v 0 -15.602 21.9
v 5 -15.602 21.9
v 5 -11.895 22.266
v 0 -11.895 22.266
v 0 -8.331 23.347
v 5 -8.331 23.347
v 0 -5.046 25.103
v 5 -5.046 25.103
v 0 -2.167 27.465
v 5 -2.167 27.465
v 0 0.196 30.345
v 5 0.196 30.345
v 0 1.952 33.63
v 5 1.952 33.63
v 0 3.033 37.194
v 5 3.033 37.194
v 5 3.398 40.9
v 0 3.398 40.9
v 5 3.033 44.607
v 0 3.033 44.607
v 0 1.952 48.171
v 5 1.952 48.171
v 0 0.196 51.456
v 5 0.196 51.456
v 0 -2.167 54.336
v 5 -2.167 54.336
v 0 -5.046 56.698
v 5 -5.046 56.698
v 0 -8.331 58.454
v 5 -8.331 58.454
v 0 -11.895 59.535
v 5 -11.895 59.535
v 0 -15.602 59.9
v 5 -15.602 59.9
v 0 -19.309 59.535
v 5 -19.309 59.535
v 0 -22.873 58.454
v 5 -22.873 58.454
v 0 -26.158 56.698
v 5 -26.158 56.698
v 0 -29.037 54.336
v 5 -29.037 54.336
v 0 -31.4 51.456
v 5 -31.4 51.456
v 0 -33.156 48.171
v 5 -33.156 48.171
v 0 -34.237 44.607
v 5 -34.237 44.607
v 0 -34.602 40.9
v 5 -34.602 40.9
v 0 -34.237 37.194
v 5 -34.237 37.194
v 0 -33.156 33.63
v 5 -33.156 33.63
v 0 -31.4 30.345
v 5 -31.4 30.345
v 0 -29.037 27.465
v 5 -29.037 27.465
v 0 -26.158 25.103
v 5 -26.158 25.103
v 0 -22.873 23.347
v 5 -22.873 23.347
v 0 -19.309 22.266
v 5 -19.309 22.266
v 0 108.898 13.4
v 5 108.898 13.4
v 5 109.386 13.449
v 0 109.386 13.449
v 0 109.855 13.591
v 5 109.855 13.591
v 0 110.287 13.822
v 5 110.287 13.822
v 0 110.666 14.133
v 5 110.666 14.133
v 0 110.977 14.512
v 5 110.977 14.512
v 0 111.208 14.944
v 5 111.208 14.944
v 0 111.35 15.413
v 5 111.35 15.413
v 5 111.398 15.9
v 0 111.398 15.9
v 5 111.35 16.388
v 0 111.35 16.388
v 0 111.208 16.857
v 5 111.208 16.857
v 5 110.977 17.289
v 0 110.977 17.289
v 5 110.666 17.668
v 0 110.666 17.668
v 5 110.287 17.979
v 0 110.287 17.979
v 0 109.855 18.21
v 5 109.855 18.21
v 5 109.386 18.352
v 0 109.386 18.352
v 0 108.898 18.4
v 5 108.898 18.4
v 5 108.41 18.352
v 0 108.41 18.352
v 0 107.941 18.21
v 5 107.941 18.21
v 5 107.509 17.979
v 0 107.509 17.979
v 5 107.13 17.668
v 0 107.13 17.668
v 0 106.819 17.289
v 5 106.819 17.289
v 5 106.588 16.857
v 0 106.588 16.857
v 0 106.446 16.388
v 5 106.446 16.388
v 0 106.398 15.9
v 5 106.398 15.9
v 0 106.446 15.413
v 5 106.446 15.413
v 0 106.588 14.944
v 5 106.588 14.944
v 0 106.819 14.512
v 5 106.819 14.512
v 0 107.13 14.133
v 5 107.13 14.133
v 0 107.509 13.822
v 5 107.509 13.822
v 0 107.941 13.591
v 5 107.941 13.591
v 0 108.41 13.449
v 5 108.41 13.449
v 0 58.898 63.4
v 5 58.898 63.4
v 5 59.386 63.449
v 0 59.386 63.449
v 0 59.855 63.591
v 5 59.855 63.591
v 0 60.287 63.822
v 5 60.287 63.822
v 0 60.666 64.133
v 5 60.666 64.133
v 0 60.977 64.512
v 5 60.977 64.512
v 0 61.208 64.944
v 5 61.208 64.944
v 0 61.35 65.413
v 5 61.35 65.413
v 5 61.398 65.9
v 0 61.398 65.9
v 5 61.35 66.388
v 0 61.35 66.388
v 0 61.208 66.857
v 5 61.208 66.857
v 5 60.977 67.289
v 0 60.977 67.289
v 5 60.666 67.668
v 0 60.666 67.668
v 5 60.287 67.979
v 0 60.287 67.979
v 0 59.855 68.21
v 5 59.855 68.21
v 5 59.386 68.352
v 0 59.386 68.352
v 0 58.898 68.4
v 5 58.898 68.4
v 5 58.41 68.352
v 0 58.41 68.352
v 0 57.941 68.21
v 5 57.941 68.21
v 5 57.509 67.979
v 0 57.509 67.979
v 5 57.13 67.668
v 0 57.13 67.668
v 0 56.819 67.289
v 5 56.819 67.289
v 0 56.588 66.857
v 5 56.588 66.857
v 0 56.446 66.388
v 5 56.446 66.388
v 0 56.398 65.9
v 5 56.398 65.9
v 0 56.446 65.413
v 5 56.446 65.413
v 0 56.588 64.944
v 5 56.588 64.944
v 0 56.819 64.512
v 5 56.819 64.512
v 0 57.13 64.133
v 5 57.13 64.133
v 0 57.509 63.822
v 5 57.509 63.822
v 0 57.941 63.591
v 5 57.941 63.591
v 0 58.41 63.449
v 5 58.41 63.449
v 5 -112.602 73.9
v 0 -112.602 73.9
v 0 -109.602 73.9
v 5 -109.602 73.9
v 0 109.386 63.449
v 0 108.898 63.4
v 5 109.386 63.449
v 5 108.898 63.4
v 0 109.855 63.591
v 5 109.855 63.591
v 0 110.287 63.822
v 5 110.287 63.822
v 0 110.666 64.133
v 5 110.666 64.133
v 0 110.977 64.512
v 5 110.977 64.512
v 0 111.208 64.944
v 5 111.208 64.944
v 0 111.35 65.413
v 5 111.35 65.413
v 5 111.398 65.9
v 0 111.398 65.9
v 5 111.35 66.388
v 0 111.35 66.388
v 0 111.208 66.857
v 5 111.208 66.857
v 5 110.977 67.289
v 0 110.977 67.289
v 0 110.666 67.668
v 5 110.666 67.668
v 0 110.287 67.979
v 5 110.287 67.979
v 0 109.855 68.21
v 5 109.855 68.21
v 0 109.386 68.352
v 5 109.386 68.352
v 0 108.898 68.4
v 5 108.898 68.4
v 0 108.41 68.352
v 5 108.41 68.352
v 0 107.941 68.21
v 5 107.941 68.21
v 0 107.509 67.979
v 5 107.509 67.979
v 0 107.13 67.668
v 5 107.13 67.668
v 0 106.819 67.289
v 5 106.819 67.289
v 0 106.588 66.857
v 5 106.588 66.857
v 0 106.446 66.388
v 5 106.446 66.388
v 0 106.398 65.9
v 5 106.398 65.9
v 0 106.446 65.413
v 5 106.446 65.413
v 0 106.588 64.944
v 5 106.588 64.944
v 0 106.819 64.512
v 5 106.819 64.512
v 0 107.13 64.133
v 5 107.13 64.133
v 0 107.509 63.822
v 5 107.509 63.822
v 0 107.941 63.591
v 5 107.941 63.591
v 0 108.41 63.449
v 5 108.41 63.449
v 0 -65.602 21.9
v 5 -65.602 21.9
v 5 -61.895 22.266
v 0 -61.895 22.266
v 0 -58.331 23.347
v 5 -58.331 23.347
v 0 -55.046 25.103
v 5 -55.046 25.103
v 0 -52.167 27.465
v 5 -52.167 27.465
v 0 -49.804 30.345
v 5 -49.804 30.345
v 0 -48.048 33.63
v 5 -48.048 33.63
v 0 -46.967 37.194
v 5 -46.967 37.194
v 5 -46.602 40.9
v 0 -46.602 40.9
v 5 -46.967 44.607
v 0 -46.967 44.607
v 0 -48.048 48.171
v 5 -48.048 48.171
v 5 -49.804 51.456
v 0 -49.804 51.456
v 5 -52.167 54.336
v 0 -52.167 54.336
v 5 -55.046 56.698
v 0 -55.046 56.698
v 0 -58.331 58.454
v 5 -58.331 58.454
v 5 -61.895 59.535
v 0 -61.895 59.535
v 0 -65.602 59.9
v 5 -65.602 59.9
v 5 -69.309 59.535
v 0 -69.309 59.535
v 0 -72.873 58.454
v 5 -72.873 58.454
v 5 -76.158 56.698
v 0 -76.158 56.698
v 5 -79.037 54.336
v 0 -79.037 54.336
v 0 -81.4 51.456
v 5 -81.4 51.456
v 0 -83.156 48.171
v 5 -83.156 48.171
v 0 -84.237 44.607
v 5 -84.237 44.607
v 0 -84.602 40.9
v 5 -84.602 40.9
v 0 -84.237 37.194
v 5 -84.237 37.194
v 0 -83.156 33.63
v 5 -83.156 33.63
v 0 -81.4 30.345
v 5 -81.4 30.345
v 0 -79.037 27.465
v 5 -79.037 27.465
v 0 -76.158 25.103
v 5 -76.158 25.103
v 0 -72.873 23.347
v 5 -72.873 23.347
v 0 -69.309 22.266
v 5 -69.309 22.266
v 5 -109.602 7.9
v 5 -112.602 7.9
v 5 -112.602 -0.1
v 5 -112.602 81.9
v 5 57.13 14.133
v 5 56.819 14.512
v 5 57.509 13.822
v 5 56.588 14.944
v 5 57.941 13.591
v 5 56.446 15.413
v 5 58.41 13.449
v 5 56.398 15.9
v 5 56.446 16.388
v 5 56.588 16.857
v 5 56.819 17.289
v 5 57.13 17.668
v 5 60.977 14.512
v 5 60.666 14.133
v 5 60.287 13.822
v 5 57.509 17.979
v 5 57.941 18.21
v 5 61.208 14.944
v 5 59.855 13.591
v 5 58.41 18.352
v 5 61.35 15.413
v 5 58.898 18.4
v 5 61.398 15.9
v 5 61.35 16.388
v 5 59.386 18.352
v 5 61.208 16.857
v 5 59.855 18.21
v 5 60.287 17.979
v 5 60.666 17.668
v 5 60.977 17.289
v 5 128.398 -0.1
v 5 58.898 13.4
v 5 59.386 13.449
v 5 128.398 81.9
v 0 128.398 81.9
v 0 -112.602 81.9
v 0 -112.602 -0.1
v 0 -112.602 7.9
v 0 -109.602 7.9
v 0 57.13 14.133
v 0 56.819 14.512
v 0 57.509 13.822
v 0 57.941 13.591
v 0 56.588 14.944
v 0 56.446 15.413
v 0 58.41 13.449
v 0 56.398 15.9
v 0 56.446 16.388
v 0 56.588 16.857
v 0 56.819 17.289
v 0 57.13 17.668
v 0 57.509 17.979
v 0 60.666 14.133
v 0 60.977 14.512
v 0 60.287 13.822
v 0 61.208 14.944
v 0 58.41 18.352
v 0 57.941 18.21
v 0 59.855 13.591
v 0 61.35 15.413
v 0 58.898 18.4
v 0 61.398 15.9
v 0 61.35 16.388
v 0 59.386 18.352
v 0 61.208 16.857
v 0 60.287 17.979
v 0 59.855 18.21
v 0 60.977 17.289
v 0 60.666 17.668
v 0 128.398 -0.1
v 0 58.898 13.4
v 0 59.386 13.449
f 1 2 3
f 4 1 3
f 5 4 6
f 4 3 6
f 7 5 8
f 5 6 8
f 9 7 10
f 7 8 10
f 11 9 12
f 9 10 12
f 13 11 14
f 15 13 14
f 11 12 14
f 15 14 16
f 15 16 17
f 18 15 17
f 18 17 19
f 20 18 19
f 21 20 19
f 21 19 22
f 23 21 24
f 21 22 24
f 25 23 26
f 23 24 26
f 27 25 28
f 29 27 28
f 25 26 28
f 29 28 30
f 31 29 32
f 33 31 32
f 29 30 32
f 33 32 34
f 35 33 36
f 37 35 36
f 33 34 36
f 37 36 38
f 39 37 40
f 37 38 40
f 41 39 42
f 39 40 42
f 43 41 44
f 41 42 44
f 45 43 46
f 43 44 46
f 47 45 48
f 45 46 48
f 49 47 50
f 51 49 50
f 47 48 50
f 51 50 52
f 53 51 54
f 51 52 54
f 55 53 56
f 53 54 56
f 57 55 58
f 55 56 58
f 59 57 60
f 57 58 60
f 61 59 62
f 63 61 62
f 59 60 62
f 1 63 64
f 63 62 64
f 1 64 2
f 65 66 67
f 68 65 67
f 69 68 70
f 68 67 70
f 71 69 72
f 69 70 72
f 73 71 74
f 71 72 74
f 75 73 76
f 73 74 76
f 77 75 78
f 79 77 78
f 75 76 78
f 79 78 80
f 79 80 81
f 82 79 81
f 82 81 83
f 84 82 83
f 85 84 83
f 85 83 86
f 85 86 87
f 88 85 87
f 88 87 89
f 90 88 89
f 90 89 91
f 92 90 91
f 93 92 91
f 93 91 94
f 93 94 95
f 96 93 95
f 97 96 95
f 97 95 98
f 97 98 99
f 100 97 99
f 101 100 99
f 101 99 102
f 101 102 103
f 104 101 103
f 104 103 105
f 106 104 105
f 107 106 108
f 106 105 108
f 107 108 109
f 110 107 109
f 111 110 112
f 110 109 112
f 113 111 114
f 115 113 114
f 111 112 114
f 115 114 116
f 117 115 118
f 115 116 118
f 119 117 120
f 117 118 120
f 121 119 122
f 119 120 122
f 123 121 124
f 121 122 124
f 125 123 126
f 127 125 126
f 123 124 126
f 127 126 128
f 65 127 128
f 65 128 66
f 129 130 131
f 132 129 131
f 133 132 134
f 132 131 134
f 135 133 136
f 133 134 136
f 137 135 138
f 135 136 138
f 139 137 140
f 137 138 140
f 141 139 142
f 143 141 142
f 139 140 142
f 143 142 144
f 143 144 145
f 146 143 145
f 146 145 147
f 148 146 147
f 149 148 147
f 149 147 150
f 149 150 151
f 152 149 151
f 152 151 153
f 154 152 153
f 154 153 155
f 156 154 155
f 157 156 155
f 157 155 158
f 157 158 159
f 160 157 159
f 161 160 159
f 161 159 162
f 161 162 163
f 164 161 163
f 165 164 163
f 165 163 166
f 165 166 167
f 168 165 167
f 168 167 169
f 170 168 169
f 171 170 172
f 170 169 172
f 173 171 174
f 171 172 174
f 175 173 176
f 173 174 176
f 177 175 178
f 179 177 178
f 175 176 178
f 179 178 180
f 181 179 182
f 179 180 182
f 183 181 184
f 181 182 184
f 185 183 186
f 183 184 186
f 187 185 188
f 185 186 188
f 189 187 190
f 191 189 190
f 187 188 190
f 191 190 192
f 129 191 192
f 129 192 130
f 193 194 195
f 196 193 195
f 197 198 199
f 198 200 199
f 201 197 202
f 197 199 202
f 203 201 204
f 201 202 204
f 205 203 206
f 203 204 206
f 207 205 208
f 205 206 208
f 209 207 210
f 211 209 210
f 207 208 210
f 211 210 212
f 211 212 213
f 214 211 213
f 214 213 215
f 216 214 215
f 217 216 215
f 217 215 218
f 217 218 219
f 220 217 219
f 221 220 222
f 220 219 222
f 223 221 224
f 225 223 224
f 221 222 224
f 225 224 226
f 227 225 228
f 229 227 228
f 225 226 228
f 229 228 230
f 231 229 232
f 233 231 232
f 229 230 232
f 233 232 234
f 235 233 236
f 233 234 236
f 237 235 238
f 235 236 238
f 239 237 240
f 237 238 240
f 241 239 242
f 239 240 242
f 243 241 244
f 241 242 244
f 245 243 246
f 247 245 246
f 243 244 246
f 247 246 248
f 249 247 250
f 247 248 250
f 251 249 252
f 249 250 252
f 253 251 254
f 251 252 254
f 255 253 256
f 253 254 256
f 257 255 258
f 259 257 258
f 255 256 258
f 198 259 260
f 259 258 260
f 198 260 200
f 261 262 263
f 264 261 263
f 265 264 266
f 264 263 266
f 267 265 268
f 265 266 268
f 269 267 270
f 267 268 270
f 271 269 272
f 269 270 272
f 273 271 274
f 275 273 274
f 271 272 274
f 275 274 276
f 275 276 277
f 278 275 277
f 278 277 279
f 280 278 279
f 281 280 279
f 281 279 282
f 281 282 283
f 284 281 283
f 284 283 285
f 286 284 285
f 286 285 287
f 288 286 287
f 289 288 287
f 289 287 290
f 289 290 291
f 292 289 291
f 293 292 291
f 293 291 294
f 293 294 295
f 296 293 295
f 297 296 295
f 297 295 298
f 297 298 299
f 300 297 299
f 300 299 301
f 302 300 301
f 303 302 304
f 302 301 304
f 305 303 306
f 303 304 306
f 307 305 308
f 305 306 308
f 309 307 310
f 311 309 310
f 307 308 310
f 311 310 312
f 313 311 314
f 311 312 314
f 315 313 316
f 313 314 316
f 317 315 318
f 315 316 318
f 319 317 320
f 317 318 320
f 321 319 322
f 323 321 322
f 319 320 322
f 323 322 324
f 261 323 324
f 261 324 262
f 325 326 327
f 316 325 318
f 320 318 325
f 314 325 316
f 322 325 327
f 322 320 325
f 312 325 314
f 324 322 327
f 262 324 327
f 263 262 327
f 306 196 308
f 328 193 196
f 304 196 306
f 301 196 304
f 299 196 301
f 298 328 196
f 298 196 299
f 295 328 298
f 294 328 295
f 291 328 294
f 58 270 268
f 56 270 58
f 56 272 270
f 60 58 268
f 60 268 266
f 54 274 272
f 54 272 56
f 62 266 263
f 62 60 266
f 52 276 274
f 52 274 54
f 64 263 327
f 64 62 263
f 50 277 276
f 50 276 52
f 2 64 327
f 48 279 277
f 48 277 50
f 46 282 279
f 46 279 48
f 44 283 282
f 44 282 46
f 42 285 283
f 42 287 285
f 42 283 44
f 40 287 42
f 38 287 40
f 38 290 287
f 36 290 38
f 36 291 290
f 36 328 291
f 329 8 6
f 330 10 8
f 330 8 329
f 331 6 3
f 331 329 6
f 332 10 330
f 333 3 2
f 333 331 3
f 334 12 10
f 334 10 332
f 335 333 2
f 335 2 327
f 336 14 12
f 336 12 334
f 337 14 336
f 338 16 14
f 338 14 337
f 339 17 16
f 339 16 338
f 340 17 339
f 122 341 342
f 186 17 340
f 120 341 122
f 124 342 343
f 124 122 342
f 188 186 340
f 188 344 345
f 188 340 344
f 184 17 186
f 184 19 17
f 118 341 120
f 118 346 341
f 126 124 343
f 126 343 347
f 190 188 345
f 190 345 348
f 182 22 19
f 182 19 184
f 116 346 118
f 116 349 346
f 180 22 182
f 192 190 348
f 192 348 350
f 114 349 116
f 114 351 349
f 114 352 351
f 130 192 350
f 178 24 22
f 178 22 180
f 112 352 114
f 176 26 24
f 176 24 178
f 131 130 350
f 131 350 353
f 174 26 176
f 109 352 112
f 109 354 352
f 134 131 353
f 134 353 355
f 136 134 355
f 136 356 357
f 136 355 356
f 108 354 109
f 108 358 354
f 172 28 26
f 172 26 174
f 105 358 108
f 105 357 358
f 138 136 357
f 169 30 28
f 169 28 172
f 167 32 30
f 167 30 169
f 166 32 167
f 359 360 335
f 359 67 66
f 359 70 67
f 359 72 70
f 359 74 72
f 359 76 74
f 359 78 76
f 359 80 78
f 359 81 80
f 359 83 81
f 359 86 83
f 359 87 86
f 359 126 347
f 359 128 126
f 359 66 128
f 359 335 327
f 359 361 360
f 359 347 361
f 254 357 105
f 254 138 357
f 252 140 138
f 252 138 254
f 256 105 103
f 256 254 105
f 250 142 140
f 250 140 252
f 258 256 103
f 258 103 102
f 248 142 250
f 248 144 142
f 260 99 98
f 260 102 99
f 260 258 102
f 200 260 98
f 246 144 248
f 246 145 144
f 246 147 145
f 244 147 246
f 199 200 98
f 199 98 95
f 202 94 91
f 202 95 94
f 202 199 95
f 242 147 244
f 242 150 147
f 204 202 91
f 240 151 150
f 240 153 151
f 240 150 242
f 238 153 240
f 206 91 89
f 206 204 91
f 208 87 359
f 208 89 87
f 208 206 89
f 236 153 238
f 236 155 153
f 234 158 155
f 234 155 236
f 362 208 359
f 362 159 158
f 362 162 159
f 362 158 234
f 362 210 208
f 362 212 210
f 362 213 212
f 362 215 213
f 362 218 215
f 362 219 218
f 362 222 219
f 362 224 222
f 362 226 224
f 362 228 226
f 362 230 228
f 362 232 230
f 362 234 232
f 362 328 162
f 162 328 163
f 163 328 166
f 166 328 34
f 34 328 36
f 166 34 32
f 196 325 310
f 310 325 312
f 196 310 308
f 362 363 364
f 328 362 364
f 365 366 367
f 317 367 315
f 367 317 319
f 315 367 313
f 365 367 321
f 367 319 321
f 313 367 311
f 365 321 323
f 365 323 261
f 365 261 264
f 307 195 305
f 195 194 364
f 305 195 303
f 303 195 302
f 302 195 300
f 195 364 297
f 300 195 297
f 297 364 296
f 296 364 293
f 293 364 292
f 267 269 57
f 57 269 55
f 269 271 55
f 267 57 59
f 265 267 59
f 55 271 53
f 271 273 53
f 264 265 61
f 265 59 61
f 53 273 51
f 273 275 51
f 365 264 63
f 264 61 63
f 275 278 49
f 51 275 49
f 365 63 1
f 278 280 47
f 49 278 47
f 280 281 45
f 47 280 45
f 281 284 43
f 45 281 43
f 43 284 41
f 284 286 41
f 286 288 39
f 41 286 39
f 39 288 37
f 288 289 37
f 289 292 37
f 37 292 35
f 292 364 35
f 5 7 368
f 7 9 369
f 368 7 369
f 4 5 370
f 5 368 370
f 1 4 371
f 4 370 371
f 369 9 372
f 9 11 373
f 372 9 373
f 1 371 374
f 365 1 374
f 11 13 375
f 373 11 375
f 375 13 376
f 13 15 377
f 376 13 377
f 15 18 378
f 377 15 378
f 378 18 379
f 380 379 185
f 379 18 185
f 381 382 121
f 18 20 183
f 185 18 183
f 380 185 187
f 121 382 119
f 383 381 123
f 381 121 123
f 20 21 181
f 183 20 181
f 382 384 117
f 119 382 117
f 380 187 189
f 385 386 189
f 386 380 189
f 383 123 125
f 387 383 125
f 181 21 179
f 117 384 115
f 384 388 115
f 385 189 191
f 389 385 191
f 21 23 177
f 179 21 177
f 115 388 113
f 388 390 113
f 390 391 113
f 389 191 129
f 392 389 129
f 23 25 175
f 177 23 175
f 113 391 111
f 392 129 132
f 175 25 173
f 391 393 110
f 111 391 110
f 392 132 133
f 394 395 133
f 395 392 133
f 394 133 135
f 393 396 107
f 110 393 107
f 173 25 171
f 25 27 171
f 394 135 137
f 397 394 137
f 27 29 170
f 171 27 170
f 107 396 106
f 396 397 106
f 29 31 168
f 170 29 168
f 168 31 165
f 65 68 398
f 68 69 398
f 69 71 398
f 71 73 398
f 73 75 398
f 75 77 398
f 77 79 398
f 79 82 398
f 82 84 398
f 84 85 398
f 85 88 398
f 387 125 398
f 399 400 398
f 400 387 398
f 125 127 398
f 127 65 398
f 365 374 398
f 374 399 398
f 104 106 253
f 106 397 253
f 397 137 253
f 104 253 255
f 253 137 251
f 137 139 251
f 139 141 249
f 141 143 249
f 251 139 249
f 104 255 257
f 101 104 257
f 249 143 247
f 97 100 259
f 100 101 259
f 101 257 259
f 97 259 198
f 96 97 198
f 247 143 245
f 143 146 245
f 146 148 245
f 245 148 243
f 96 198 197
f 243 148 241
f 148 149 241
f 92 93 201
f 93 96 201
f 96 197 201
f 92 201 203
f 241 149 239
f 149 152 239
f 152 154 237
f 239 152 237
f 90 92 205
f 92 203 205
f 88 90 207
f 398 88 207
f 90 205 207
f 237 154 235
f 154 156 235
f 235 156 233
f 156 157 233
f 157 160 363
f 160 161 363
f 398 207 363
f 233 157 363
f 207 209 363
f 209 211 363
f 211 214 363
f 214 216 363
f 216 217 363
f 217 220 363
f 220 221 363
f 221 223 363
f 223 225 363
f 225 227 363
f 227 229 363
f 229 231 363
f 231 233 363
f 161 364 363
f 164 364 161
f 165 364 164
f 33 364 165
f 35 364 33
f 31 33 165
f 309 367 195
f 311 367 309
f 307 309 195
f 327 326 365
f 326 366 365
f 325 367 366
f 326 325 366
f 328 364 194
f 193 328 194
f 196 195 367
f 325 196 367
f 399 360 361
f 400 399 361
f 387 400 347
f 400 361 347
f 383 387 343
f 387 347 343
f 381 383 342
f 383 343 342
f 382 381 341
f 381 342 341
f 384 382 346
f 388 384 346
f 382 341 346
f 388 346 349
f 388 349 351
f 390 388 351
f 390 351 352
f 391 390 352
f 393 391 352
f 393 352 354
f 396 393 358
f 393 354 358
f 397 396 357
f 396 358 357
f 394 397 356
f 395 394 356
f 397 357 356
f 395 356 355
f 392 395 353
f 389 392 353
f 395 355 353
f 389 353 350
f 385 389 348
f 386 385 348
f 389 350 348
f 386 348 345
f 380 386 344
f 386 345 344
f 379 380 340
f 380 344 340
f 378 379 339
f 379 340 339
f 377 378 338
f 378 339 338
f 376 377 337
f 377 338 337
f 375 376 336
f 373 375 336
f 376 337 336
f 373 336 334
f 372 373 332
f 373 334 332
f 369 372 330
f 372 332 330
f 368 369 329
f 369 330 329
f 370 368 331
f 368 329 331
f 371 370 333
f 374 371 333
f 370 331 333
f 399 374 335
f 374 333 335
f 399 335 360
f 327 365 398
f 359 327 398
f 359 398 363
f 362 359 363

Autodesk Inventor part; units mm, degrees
ref_plane "YZ Plane" through (0, 0, 0) normal (1, 0, 0) x (0, 1, 0)
ref_plane "XZ Plane" through (0, 0, 0) normal (0, 1, 0) x (-1, 0, 0)
ref_plane "XY Plane" through (0, 0, 0) normal (0, 0, 1) x (1, 0, 0)
sketch "Sketch1" plane through (0, 0, 0) normal (1, 0, 0) x (0, 1, 0)
  line L0 (128.3979, 81.9005) -> (-112.6021, 81.9005)
  line L1 (-112.6021, 81.9005) -> (-112.6021, -0.0995)
  line L2 (-112.6021, -0.0995) -> (128.3979, -0.0995)
  line L3 (128.3979, -0.0995) -> (128.3979, 81.9005)
  circle A0 centre (-45.6021, 40.9005) radius 19 construction
  line L4 (-112.6021, 73.9005) -> (-109.6021, 73.9005)
  line L5 (-109.6021, 73.9005) -> (-109.6021, 7.9005)
  line L6 (-109.6021, 7.9005) -> (-112.6021, 7.9005)
  line L7 (-112.6021, 7.9005) -> (-112.6021, 73.9005)
  circle A1 centre (111.4349, 69.7734) radius 2.5
  point P0 (0, 0)
  dimension "d0" = 241
  dimension "d1" = 82
  dimension "d2" = 38
  dimension "d3" = 41
  dimension "d4" = 174
  dimension "d5" = 66
  dimension "d6" = 3
  dimension "d7" = 8
  dimension "d24" = 5
extrude "Extrusion3" add sketch "Sketch1" along normal blind 5 contours L3 L2 L1 L6 L5 L4 L0 | A1
sketch "Sketch3" plane through (5, 0, 0) normal (1, 0, 0) x (0, 0, -1)
  circle A0 centre (-65.9005, 108.8979) radius 2.5
  line L0 (-81.9005, 128.3979) -> (-81.9005, -112.6021) projected
  line L1 (-81.9005, 128.3979) -> (-74.525, 128.3979) construction
  line L2 (-81.9005, 122.7969) -> (-81.9005, 128.3979) construction
  circle A1 centre (-15.9005, 108.8979) radius 2.5
  circle A2 centre (-65.9005, 58.8979) radius 2.5
  circle A3 centre (-15.9005, 58.8979) radius 2.5
  line L3 (0.0995, -112.6021) -> (0.0995, 128.3979) projected
  line L4 (0.0995, 128.3979) -> (-81.9005, 128.3979) projected
  point P0 (0, 0)
  dimension "d25" = 5
  dimension "d28" = 50
  dimension "d31" = 50
  dimension "d34" = 82
  dimension "d35" = 16
  dimension "d36" = 19.5
extrude "Extrusion4" cut sketch "Sketch3" against normal up to surface (5 mm away)
sketch "Sketch4" plane through (5, 0, 0) normal (1, 0, 0) x (0, 0, -1)
  circle A0 centre (-40.9005, -65.6021) radius 19
  line L0 (-73.9005, -109.6021) -> (-7.9005, -109.6021) projected
  point P0 (0, 0)
  point P1 (-40.9005, -109.6021)
  dimension "d39" = 38
  dimension "d40" = 44
extrude "Extrusion5" cut sketch "Sketch4" against normal up to surface (5 mm away)
pattern_linear "Rectangular Pattern1" count 2 spacing 50 along (0, 1, 0) of "Extrusion5"
equation "\"d3\" = 0.5 * d1"
equation "\"d7\" = -0.5 * d5 + 0.5 * d1"
equation "\"d35\" = -0.5 * d28 + 0.5 * d34"
properties part number "center_2Poke"
